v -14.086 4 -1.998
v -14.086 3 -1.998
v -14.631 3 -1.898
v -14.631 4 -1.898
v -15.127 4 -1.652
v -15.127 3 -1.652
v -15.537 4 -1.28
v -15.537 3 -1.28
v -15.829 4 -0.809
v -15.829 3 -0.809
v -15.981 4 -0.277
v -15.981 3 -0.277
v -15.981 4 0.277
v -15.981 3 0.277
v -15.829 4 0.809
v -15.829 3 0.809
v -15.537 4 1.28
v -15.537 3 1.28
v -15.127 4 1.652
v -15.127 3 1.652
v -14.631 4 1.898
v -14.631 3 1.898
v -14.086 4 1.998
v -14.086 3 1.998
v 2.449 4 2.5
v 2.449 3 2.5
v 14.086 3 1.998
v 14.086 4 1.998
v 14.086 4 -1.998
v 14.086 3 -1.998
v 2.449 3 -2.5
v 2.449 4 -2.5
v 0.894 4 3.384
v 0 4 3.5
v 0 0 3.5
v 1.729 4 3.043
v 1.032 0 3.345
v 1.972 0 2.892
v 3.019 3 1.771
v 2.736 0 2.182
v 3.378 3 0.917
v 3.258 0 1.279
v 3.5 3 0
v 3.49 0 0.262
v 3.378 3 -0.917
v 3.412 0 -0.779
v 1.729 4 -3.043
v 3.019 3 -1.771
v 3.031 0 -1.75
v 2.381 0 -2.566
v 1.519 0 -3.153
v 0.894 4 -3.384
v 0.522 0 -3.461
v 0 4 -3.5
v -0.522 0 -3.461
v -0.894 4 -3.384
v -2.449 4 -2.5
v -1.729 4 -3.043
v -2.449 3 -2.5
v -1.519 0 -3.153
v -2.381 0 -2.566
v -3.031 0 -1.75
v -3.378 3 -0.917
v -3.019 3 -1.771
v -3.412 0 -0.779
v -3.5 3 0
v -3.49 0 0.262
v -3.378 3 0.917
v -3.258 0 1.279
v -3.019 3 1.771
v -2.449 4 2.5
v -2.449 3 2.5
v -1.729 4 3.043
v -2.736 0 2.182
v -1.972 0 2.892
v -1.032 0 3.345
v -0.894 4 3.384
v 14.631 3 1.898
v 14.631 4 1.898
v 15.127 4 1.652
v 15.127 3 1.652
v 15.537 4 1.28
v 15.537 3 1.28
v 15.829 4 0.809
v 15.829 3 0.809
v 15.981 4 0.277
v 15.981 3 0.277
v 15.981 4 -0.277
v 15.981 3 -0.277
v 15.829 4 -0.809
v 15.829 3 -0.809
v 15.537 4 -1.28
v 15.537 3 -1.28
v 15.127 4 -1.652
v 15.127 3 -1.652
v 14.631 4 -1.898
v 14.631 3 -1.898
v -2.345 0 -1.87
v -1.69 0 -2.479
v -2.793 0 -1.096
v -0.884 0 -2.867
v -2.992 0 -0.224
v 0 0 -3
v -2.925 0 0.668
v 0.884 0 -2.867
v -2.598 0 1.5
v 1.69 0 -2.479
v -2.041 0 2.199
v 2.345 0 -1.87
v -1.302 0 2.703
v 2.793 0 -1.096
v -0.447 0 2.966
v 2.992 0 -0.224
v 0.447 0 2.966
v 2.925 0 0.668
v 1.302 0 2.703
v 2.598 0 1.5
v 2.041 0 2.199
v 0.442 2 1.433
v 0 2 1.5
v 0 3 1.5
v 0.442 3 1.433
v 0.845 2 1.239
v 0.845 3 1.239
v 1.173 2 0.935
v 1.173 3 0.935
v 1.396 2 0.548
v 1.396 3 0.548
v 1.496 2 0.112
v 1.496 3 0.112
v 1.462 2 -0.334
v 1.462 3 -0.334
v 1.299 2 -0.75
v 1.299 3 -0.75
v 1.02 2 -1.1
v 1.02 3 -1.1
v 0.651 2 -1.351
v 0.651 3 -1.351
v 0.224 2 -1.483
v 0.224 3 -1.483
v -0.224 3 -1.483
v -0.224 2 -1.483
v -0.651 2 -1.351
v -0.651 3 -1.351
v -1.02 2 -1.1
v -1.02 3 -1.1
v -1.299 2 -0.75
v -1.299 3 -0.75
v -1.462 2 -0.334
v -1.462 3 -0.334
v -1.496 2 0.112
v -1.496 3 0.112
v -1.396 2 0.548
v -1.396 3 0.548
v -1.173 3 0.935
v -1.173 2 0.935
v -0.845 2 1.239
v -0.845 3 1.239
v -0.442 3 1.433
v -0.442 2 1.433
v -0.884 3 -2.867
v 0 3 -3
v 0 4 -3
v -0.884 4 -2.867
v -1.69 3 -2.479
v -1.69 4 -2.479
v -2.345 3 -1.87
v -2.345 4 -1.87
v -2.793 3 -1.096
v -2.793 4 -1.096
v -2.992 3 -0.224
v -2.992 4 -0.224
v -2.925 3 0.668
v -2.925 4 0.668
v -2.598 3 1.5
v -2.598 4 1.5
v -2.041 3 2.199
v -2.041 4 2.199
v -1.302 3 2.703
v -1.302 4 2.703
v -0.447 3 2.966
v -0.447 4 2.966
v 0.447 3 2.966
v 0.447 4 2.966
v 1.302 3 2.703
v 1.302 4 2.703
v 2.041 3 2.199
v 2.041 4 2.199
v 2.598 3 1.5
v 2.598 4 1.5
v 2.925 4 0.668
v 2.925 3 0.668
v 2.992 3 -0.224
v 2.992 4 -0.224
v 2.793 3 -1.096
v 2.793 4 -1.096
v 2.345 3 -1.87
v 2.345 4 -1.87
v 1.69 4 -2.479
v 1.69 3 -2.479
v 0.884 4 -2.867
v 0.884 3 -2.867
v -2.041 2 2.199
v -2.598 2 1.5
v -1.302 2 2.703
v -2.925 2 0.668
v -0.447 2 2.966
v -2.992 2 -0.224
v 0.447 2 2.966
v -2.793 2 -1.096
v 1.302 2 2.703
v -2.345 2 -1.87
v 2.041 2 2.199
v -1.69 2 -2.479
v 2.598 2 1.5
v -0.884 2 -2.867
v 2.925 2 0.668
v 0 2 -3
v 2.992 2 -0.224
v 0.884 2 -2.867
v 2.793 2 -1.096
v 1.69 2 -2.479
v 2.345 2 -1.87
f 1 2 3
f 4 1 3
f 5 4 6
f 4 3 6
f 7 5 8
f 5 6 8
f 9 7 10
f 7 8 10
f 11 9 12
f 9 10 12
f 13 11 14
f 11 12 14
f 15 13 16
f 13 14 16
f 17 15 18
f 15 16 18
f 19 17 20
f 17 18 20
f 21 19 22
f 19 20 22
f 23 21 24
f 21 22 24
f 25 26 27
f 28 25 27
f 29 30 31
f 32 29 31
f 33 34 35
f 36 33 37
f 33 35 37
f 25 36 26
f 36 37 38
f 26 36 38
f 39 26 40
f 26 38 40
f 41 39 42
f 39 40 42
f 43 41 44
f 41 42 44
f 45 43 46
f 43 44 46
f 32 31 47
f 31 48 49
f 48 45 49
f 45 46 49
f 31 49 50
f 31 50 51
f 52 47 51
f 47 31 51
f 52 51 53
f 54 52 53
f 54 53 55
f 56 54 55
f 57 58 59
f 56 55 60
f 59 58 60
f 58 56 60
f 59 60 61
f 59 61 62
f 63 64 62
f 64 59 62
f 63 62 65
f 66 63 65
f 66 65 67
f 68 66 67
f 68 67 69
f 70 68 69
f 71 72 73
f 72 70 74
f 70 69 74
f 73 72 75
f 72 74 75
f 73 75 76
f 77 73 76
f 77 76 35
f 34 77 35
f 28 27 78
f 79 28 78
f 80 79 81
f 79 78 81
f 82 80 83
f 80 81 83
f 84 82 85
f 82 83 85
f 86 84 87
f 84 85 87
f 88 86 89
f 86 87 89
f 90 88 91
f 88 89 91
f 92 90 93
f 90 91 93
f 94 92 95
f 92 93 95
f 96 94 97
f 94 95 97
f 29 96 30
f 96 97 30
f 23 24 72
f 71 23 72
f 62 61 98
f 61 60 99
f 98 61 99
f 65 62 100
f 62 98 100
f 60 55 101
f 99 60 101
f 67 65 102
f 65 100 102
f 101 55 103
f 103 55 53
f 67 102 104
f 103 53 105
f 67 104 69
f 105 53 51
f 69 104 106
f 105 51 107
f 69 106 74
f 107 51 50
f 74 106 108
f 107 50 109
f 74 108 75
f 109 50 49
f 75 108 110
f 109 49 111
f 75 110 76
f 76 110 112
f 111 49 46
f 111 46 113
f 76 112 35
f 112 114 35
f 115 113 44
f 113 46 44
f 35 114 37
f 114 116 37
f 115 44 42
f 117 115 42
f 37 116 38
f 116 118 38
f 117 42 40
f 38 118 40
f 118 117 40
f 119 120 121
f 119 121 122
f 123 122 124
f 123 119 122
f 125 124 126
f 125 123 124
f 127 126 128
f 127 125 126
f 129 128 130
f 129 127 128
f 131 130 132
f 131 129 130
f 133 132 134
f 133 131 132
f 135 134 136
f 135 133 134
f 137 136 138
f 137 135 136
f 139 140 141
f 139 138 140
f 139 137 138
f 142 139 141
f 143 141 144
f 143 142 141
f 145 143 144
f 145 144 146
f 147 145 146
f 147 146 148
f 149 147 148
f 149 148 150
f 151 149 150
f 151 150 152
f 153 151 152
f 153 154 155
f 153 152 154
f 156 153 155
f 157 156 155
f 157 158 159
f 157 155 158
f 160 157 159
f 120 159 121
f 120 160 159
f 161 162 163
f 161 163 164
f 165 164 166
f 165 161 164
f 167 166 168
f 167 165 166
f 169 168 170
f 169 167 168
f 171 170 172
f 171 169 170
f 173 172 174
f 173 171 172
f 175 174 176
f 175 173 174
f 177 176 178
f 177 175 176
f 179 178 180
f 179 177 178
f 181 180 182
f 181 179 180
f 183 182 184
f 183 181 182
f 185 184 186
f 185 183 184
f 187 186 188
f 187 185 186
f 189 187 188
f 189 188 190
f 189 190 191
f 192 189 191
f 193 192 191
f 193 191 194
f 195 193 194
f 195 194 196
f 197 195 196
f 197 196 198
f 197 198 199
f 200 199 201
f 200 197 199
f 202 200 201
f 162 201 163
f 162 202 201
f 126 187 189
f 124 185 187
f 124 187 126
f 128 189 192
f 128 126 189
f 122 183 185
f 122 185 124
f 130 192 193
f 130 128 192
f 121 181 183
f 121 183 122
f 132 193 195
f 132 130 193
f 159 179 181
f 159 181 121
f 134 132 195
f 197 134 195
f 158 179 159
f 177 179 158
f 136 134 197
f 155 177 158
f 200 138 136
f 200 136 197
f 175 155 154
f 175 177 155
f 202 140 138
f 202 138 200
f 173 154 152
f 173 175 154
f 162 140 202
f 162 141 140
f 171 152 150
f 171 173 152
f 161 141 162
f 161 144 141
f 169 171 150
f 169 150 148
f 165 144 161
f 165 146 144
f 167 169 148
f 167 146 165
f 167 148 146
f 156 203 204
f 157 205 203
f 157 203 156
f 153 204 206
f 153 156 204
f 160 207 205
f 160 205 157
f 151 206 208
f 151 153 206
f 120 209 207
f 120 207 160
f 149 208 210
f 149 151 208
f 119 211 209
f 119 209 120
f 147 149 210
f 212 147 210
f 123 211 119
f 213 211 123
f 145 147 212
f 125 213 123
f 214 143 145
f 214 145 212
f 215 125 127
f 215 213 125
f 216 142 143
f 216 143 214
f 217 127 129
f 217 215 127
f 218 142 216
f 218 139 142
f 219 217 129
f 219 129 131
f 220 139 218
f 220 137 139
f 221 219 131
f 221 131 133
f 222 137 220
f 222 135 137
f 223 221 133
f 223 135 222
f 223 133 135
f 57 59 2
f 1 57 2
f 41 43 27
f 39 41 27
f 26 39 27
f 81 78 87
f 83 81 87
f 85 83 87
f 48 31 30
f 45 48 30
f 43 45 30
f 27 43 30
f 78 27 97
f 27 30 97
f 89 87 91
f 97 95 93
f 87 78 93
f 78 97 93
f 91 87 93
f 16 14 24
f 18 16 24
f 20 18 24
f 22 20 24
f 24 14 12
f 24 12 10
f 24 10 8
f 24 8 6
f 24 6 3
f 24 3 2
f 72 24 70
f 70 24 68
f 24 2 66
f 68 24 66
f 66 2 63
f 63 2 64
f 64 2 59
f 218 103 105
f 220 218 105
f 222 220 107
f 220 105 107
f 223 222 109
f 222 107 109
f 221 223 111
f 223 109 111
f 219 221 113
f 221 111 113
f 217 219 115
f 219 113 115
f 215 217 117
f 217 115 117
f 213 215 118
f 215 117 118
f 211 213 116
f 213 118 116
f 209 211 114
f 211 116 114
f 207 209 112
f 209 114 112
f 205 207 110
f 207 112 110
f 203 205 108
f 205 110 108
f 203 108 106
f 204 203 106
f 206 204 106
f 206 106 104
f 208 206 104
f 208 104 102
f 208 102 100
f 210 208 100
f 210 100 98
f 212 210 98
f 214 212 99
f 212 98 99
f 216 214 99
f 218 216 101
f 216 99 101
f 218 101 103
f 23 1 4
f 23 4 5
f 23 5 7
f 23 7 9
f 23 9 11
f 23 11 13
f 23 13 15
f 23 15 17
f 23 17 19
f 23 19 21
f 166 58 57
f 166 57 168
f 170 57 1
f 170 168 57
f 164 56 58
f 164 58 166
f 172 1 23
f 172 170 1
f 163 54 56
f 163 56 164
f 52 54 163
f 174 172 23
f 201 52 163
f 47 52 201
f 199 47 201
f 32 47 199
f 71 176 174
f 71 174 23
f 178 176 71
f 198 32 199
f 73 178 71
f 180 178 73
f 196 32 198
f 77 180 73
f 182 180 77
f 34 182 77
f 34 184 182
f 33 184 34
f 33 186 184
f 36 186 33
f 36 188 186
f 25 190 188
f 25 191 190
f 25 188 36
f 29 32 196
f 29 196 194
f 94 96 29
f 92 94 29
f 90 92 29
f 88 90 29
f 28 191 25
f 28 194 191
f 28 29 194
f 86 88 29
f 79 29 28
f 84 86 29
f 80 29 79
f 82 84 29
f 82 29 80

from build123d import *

# Parameters (mm, degrees)
SKETCH_1_R          = 3.5
SKETCH_1_R_2        = 1.5
EXTRUDE_1_DEPTH     = 4
SKETCH_2_R          = 3
CUT_EXTRUDE_1_DEPTH = 2
CUT_EXTRUDE_START   = -1
SKETCH_3_R          = 3
CUT_EXTRUDE_2_DEPTH = 1
EXTRUDE_START       = -1
SKETCH_4_R          = 2
EXTRUDE_2_DEPTH     = 1


with BuildPart() as part:
    # 草图1 → 凸台-拉伸1 (new body)
    with BuildSketch(Plane(origin=(0, 0, 0), x_dir=(1, 0, 0), z_dir=(0, 1, 0))):
        with Locations(Location((0, 0, 0), (0, 0, 270))):
            Circle(SKETCH_1_R)
        with Locations(Location((0, 0, 0), (0, 0, 270))):
            Circle(SKETCH_1_R_2, mode=Mode.SUBTRACT)
    extrude(amount=EXTRUDE_1_DEPTH)

    # 草图2 → 切除-拉伸1 (cut)
    with BuildSketch(Plane.XZ):
        with Locations(Location((0, 0, 0), (0, 0, 270))):
            Circle(SKETCH_2_R)
    extrude(amount=-CUT_EXTRUDE_1_DEPTH, mode=Mode.SUBTRACT)

    # 草图3 → 切除-拉伸2 (cut)
    with BuildSketch(Plane(origin=(0, 4, 0), x_dir=(1, 0, 0), z_dir=(0, 1, 0)).offset(CUT_EXTRUDE_START)):
        with Locations(Location((0, 0, 0), (0, 0, 90))):
            Circle(SKETCH_3_R)
    extrude(amount=CUT_EXTRUDE_2_DEPTH, mode=Mode.SUBTRACT)

    # 草图4 → 凸台-拉伸2 (add)
    with BuildSketch(Plane(origin=(0, 4, 0), x_dir=(1, 0, 0), z_dir=(0, 1, 0)).offset(EXTRUDE_START)):
        with BuildLine():
            ThreePointArc((-2.449489743, -2.5), (-3.5, 0), (-2.449489743, 2.5))
            Line((-2.449489743, 2.5), (-14.086174253, 1.998142637))
            ThreePointArc((-14.086174253, 1.998142637), (-12.61658909, 1.444359461), (-12, 0))
            ThreePointArc((-12, 0), (-12.61658909, -1.444359461), (-14.086174253, -1.998142637))
            Line((-14.086174253, -1.998142637), (-2.449489743, -2.5))
        make_face()
        with BuildLine():
            ThreePointArc((14.086174253, -1.998142637), (12, 0), (14.086174253, 1.998142637))
            Line((14.086174253, 1.998142637), (2.449489743, 2.5))
            ThreePointArc((2.449489743, 2.5), (3.226702194, 1.355873501), (3.5, 0))
            ThreePointArc((3.5, 0), (3.226702194, -1.355873501), (2.449489743, -2.5))
            Line((2.449489743, -2.5), (14.086174253, -1.998142637))
        make_face()
        with Locations((-14, 0)):
            Circle(SKETCH_4_R)
        with Locations((14, 0)):
            Circle(SKETCH_4_R)
    extrude(amount=EXTRUDE_2_DEPTH)


solid = part.part
